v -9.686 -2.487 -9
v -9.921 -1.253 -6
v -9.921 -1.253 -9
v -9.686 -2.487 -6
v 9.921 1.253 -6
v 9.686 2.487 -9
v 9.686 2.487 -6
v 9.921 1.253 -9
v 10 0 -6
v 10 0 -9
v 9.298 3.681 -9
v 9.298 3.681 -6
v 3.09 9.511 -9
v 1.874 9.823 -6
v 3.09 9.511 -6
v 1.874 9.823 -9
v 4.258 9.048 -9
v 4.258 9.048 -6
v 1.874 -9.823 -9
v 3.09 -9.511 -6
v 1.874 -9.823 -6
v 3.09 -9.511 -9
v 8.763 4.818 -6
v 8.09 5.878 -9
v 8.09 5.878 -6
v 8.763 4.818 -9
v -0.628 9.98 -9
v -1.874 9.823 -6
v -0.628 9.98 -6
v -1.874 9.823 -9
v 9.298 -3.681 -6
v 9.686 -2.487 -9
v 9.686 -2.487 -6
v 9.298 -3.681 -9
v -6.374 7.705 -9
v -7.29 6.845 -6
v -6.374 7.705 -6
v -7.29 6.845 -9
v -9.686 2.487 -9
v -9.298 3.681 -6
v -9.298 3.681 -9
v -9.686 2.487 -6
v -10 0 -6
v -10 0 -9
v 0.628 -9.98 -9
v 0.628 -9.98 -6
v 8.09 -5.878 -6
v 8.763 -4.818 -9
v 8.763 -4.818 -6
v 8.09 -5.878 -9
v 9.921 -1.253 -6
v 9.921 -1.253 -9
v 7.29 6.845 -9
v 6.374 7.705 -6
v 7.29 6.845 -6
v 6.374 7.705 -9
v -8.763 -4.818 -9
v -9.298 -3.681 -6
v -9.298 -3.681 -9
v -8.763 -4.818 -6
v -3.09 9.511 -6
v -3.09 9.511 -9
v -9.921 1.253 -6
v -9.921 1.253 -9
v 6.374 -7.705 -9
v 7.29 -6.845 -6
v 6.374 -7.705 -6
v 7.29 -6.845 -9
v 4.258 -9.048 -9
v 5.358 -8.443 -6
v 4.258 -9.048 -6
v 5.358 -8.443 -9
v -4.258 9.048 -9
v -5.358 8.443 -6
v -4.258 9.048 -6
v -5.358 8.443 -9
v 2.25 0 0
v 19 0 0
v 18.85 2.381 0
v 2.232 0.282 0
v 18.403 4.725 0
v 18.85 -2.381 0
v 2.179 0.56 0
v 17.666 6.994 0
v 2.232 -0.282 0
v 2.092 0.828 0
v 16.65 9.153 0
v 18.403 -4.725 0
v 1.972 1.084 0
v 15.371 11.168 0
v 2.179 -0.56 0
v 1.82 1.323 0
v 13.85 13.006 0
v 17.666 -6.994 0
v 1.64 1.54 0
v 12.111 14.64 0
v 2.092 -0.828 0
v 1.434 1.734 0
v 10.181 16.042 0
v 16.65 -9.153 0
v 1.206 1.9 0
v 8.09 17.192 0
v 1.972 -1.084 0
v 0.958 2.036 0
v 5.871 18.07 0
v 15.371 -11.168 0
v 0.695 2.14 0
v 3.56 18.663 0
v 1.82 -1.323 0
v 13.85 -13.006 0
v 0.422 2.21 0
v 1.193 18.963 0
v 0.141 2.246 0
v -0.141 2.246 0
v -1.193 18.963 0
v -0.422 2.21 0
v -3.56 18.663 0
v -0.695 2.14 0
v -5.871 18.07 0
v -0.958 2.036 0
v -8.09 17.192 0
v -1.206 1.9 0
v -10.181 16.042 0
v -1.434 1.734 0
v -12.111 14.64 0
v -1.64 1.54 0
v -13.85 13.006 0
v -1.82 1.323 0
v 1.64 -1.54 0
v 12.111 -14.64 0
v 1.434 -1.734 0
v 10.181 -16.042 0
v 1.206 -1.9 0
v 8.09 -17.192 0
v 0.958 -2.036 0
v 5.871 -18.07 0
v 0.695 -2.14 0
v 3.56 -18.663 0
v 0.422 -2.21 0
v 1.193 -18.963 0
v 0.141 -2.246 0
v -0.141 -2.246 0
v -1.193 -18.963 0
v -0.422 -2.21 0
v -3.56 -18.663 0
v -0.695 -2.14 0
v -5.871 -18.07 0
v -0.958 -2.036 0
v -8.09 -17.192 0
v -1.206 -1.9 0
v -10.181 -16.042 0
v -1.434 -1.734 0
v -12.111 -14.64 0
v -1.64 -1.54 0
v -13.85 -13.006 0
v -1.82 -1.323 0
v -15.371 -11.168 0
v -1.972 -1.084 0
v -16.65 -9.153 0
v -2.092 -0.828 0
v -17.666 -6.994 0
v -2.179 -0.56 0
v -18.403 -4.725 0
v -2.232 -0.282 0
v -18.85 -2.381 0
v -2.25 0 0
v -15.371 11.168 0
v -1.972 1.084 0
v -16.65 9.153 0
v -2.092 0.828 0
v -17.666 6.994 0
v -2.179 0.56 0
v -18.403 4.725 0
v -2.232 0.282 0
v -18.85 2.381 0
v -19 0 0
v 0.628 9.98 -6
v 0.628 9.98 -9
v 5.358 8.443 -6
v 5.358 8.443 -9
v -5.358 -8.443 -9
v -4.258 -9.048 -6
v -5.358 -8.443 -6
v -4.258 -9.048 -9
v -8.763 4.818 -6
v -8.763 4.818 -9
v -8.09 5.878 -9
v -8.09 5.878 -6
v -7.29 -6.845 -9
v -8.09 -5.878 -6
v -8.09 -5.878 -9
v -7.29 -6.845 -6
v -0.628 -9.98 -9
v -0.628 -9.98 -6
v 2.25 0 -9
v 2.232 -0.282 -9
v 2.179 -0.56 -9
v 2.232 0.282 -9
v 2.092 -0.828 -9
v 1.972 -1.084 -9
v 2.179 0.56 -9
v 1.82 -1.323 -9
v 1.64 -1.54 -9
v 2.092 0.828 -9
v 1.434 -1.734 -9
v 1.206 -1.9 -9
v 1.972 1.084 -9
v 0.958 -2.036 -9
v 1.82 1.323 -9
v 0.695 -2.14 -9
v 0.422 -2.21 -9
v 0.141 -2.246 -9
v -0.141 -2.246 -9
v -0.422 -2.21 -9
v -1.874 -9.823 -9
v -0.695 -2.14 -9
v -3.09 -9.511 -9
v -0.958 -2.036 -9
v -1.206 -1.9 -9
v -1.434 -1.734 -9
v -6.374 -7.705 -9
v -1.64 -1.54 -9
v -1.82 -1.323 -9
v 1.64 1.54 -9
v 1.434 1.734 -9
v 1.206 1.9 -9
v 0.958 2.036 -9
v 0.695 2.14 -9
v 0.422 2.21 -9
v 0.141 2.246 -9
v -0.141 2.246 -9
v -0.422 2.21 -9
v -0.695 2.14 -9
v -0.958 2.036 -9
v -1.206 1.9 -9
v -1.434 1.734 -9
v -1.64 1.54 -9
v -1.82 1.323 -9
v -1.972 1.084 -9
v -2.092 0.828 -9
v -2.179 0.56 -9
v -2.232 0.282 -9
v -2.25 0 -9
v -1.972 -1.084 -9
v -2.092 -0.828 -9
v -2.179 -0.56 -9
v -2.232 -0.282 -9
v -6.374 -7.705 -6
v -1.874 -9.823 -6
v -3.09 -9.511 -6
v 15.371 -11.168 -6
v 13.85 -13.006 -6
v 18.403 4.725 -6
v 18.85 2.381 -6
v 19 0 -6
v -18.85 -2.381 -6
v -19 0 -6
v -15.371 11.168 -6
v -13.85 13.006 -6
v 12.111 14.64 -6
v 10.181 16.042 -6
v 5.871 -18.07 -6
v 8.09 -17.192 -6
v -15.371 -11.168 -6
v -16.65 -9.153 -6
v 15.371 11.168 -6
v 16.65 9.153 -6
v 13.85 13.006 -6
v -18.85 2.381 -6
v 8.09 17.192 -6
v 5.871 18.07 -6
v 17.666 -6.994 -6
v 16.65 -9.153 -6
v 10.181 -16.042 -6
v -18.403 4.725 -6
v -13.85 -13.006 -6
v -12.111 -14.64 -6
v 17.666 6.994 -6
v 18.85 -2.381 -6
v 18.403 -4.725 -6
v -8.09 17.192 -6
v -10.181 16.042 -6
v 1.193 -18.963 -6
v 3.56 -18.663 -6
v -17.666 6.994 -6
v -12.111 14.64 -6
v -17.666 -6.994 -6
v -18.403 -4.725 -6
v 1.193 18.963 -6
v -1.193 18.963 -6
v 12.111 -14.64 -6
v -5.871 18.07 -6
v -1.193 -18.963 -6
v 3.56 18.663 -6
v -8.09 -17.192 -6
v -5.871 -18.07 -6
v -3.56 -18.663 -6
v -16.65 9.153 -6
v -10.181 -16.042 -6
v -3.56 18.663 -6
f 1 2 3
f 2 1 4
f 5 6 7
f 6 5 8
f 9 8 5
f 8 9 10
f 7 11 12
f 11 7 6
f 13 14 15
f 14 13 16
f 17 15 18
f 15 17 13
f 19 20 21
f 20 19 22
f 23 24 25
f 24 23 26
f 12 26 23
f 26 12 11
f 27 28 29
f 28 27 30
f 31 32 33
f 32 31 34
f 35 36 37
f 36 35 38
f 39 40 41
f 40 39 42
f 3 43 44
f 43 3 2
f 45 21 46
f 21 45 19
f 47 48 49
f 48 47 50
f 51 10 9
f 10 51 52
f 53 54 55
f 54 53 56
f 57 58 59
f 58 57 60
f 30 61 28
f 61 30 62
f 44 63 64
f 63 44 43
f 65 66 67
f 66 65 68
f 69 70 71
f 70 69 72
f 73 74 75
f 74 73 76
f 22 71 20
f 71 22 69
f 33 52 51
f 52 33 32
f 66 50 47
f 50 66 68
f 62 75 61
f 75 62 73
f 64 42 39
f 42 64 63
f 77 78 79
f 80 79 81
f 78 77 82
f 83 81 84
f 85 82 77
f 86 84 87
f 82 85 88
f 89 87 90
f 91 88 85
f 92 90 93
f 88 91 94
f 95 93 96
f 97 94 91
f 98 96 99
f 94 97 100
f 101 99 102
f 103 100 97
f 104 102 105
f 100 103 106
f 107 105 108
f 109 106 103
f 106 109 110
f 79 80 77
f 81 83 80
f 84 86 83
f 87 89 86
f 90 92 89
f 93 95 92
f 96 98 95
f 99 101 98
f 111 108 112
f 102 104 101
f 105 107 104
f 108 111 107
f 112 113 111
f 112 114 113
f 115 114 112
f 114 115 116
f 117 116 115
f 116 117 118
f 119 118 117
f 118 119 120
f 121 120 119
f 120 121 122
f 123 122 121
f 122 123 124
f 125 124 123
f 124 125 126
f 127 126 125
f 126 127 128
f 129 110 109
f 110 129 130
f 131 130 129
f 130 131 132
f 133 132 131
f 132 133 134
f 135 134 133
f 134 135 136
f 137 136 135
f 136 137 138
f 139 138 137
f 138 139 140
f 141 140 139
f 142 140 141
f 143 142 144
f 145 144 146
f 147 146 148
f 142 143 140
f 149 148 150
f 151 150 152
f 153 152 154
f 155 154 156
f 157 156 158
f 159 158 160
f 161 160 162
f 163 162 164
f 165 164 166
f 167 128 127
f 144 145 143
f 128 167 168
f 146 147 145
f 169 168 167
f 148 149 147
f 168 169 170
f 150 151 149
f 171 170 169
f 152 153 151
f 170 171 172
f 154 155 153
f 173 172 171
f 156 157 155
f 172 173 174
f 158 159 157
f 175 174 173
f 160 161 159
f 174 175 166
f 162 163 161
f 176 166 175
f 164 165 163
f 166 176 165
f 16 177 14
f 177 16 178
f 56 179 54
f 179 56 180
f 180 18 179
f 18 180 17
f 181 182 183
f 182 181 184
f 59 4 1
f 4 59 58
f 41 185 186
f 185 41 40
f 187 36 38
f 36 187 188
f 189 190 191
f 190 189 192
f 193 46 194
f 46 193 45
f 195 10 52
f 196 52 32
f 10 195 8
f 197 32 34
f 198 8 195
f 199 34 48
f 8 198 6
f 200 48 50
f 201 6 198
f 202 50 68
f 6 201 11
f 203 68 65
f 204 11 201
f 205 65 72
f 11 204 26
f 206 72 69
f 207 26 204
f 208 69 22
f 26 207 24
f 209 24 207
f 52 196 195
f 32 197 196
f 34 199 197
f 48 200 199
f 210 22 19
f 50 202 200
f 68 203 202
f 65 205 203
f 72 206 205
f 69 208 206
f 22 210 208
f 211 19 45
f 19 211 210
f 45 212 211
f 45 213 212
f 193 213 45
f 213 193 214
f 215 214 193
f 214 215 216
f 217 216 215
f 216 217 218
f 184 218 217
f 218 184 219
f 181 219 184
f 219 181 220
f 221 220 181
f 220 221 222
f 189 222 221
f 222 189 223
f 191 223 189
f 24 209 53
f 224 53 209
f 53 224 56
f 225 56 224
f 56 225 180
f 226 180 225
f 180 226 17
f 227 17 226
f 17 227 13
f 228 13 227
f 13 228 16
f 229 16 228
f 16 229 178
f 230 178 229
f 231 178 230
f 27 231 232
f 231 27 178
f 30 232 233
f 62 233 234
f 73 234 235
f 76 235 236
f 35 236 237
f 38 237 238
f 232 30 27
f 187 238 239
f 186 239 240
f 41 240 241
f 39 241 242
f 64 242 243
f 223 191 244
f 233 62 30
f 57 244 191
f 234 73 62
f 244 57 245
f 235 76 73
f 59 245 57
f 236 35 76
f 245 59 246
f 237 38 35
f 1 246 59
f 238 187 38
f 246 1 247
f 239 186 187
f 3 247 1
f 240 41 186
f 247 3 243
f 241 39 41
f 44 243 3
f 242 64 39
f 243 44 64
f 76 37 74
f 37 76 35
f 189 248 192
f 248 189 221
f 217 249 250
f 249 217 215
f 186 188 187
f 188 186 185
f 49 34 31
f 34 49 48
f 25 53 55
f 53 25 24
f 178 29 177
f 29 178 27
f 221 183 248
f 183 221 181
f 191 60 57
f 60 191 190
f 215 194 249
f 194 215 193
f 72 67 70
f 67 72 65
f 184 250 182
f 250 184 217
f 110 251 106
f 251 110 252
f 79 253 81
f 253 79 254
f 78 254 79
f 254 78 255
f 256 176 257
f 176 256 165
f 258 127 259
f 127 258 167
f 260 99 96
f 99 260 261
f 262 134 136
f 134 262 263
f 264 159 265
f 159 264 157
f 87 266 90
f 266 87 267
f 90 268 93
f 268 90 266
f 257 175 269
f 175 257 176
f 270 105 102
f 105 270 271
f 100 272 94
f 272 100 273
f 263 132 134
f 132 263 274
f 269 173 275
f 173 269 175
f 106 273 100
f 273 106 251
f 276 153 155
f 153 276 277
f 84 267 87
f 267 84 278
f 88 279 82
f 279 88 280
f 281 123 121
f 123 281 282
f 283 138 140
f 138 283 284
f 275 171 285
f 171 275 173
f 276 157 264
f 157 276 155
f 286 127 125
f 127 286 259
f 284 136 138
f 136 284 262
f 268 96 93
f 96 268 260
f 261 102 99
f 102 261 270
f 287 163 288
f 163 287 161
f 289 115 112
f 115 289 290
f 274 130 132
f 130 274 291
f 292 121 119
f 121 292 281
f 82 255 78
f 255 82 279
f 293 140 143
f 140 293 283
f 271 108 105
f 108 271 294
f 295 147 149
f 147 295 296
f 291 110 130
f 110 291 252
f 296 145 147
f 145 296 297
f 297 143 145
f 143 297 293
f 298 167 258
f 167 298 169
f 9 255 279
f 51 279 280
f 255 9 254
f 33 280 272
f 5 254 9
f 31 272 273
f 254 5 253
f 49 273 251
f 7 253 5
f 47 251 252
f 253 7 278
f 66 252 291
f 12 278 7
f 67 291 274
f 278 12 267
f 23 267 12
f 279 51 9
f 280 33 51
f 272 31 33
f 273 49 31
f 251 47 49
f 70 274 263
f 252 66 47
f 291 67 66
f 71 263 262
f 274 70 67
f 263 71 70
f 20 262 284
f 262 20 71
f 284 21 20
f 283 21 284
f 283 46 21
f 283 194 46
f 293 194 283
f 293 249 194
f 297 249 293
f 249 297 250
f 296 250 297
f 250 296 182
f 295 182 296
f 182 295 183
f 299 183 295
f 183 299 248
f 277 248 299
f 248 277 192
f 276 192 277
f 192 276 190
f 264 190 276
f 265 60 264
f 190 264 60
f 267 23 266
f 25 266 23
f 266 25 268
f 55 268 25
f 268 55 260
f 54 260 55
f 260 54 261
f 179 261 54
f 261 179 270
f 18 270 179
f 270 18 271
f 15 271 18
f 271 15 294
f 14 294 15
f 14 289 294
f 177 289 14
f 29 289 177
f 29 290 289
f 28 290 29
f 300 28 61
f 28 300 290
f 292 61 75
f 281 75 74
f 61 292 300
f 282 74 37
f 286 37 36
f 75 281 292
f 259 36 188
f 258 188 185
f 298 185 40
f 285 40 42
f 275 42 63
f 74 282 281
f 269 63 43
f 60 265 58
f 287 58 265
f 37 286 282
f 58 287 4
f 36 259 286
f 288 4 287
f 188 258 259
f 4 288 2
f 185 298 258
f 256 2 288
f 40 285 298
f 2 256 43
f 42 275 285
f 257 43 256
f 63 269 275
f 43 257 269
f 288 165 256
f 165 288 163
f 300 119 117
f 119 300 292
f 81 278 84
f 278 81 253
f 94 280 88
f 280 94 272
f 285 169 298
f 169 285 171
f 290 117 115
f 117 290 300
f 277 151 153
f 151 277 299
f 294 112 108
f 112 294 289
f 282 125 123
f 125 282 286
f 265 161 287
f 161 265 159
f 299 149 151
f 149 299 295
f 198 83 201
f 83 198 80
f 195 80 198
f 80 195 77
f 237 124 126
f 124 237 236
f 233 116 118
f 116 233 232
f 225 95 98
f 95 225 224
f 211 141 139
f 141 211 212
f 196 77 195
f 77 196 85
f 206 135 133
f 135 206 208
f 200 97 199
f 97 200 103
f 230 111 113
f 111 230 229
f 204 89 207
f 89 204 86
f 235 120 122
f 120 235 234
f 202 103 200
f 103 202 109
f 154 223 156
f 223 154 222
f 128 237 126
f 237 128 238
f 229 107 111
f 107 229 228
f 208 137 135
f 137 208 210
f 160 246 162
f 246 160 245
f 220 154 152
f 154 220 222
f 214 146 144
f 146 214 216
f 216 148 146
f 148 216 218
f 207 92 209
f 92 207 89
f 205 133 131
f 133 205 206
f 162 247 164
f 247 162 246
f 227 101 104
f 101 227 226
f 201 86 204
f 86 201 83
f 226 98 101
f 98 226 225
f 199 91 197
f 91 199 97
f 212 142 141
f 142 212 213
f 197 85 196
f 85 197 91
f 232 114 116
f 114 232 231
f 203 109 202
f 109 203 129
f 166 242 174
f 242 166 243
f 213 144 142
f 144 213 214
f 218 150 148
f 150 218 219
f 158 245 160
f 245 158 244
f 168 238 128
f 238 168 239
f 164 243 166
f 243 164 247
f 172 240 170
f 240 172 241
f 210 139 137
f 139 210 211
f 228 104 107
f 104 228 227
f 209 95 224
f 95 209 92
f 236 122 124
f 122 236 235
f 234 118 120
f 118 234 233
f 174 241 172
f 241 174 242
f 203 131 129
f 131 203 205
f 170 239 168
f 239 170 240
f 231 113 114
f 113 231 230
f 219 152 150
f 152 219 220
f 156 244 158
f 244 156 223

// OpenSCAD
$fn = 50;


difference() {
	union() {
		translate(v = [0, 0, -9.0000000000]) {
			cylinder(h = 9, r = 10.0000000000);
		}
		translate(v = [0, 0, -6.0000000000]) {
			cylinder(h = 6, r = 19.0000000000);
		}
	}
	union() {
		#translate(v = [0, 0, -9]) {
			cylinder(h = 9, r = 2.2500000000);
		}
	}
}
